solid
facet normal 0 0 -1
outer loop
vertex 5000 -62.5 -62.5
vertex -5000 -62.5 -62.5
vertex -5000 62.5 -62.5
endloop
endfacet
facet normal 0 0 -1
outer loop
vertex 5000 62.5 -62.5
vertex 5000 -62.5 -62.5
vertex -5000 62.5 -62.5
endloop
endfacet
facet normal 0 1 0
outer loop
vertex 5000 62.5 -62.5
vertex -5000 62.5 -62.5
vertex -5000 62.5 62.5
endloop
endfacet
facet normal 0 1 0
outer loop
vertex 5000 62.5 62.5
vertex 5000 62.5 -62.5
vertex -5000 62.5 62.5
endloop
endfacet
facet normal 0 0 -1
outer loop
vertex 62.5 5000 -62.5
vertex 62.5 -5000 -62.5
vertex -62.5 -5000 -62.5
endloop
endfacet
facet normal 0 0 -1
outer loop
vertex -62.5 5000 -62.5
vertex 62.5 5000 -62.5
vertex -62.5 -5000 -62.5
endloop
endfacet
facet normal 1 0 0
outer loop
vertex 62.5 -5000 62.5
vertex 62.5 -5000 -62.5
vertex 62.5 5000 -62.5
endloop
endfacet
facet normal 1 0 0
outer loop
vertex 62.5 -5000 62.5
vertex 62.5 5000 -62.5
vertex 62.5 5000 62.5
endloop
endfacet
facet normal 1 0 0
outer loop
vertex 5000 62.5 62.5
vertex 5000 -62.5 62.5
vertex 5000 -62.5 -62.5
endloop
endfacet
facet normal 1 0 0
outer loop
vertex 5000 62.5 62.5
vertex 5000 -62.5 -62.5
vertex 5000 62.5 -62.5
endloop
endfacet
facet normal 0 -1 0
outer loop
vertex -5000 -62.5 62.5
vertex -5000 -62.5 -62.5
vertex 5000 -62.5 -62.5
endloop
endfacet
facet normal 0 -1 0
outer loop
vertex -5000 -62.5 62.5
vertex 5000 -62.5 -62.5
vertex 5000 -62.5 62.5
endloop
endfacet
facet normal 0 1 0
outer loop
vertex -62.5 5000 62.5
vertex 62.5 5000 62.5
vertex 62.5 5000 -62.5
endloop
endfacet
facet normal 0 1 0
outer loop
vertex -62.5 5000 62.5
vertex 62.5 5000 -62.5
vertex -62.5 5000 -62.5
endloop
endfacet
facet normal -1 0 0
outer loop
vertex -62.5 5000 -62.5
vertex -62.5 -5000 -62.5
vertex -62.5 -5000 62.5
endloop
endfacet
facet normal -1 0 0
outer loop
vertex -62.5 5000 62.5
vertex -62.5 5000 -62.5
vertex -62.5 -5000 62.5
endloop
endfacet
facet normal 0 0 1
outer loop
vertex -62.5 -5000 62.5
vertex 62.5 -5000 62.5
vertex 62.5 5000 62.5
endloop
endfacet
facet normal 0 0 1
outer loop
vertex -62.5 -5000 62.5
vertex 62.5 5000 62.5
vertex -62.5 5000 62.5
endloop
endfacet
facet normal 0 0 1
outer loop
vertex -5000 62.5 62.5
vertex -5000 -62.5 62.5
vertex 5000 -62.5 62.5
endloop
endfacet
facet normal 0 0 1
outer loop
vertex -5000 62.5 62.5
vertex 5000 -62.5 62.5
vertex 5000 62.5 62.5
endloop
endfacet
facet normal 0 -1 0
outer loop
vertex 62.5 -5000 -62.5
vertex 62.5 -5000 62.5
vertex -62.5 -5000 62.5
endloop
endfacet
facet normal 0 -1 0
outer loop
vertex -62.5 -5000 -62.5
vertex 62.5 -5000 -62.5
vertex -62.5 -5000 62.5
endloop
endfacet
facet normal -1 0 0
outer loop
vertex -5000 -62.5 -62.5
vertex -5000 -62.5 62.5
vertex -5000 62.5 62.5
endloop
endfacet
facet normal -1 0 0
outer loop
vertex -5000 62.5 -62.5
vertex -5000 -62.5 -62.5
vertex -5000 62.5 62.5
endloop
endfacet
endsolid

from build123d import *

# Parameters (mm, degrees)
SKETCH11_W               = 125
SKETCH11_H               = 125
STRUCTURAL_MEMBER1_DEPTH = 10000
SKETCH12_W               = 125
SKETCH12_H               = 125
STRUCTURAL_MEMBER2_DEPTH = 10000


with BuildPart() as part:
    # Sketch11 → Structural Member1 (new body)
    with BuildSketch(Plane.YZ.offset(-5000)):
        Rectangle(SKETCH11_W, SKETCH11_H)
    extrude(amount=STRUCTURAL_MEMBER1_DEPTH)


with BuildPart() as body_2:
    # Sketch12 → Structural Member2 (new body)
    with BuildSketch(Plane(origin=(0, -5000, 0), x_dir=(-1, 0, 0), z_dir=(0, 1, 0))):
        Rectangle(SKETCH12_W, SKETCH12_H)
    extrude(amount=STRUCTURAL_MEMBER2_DEPTH)


solid = Compound([part.part, body_2.part])
